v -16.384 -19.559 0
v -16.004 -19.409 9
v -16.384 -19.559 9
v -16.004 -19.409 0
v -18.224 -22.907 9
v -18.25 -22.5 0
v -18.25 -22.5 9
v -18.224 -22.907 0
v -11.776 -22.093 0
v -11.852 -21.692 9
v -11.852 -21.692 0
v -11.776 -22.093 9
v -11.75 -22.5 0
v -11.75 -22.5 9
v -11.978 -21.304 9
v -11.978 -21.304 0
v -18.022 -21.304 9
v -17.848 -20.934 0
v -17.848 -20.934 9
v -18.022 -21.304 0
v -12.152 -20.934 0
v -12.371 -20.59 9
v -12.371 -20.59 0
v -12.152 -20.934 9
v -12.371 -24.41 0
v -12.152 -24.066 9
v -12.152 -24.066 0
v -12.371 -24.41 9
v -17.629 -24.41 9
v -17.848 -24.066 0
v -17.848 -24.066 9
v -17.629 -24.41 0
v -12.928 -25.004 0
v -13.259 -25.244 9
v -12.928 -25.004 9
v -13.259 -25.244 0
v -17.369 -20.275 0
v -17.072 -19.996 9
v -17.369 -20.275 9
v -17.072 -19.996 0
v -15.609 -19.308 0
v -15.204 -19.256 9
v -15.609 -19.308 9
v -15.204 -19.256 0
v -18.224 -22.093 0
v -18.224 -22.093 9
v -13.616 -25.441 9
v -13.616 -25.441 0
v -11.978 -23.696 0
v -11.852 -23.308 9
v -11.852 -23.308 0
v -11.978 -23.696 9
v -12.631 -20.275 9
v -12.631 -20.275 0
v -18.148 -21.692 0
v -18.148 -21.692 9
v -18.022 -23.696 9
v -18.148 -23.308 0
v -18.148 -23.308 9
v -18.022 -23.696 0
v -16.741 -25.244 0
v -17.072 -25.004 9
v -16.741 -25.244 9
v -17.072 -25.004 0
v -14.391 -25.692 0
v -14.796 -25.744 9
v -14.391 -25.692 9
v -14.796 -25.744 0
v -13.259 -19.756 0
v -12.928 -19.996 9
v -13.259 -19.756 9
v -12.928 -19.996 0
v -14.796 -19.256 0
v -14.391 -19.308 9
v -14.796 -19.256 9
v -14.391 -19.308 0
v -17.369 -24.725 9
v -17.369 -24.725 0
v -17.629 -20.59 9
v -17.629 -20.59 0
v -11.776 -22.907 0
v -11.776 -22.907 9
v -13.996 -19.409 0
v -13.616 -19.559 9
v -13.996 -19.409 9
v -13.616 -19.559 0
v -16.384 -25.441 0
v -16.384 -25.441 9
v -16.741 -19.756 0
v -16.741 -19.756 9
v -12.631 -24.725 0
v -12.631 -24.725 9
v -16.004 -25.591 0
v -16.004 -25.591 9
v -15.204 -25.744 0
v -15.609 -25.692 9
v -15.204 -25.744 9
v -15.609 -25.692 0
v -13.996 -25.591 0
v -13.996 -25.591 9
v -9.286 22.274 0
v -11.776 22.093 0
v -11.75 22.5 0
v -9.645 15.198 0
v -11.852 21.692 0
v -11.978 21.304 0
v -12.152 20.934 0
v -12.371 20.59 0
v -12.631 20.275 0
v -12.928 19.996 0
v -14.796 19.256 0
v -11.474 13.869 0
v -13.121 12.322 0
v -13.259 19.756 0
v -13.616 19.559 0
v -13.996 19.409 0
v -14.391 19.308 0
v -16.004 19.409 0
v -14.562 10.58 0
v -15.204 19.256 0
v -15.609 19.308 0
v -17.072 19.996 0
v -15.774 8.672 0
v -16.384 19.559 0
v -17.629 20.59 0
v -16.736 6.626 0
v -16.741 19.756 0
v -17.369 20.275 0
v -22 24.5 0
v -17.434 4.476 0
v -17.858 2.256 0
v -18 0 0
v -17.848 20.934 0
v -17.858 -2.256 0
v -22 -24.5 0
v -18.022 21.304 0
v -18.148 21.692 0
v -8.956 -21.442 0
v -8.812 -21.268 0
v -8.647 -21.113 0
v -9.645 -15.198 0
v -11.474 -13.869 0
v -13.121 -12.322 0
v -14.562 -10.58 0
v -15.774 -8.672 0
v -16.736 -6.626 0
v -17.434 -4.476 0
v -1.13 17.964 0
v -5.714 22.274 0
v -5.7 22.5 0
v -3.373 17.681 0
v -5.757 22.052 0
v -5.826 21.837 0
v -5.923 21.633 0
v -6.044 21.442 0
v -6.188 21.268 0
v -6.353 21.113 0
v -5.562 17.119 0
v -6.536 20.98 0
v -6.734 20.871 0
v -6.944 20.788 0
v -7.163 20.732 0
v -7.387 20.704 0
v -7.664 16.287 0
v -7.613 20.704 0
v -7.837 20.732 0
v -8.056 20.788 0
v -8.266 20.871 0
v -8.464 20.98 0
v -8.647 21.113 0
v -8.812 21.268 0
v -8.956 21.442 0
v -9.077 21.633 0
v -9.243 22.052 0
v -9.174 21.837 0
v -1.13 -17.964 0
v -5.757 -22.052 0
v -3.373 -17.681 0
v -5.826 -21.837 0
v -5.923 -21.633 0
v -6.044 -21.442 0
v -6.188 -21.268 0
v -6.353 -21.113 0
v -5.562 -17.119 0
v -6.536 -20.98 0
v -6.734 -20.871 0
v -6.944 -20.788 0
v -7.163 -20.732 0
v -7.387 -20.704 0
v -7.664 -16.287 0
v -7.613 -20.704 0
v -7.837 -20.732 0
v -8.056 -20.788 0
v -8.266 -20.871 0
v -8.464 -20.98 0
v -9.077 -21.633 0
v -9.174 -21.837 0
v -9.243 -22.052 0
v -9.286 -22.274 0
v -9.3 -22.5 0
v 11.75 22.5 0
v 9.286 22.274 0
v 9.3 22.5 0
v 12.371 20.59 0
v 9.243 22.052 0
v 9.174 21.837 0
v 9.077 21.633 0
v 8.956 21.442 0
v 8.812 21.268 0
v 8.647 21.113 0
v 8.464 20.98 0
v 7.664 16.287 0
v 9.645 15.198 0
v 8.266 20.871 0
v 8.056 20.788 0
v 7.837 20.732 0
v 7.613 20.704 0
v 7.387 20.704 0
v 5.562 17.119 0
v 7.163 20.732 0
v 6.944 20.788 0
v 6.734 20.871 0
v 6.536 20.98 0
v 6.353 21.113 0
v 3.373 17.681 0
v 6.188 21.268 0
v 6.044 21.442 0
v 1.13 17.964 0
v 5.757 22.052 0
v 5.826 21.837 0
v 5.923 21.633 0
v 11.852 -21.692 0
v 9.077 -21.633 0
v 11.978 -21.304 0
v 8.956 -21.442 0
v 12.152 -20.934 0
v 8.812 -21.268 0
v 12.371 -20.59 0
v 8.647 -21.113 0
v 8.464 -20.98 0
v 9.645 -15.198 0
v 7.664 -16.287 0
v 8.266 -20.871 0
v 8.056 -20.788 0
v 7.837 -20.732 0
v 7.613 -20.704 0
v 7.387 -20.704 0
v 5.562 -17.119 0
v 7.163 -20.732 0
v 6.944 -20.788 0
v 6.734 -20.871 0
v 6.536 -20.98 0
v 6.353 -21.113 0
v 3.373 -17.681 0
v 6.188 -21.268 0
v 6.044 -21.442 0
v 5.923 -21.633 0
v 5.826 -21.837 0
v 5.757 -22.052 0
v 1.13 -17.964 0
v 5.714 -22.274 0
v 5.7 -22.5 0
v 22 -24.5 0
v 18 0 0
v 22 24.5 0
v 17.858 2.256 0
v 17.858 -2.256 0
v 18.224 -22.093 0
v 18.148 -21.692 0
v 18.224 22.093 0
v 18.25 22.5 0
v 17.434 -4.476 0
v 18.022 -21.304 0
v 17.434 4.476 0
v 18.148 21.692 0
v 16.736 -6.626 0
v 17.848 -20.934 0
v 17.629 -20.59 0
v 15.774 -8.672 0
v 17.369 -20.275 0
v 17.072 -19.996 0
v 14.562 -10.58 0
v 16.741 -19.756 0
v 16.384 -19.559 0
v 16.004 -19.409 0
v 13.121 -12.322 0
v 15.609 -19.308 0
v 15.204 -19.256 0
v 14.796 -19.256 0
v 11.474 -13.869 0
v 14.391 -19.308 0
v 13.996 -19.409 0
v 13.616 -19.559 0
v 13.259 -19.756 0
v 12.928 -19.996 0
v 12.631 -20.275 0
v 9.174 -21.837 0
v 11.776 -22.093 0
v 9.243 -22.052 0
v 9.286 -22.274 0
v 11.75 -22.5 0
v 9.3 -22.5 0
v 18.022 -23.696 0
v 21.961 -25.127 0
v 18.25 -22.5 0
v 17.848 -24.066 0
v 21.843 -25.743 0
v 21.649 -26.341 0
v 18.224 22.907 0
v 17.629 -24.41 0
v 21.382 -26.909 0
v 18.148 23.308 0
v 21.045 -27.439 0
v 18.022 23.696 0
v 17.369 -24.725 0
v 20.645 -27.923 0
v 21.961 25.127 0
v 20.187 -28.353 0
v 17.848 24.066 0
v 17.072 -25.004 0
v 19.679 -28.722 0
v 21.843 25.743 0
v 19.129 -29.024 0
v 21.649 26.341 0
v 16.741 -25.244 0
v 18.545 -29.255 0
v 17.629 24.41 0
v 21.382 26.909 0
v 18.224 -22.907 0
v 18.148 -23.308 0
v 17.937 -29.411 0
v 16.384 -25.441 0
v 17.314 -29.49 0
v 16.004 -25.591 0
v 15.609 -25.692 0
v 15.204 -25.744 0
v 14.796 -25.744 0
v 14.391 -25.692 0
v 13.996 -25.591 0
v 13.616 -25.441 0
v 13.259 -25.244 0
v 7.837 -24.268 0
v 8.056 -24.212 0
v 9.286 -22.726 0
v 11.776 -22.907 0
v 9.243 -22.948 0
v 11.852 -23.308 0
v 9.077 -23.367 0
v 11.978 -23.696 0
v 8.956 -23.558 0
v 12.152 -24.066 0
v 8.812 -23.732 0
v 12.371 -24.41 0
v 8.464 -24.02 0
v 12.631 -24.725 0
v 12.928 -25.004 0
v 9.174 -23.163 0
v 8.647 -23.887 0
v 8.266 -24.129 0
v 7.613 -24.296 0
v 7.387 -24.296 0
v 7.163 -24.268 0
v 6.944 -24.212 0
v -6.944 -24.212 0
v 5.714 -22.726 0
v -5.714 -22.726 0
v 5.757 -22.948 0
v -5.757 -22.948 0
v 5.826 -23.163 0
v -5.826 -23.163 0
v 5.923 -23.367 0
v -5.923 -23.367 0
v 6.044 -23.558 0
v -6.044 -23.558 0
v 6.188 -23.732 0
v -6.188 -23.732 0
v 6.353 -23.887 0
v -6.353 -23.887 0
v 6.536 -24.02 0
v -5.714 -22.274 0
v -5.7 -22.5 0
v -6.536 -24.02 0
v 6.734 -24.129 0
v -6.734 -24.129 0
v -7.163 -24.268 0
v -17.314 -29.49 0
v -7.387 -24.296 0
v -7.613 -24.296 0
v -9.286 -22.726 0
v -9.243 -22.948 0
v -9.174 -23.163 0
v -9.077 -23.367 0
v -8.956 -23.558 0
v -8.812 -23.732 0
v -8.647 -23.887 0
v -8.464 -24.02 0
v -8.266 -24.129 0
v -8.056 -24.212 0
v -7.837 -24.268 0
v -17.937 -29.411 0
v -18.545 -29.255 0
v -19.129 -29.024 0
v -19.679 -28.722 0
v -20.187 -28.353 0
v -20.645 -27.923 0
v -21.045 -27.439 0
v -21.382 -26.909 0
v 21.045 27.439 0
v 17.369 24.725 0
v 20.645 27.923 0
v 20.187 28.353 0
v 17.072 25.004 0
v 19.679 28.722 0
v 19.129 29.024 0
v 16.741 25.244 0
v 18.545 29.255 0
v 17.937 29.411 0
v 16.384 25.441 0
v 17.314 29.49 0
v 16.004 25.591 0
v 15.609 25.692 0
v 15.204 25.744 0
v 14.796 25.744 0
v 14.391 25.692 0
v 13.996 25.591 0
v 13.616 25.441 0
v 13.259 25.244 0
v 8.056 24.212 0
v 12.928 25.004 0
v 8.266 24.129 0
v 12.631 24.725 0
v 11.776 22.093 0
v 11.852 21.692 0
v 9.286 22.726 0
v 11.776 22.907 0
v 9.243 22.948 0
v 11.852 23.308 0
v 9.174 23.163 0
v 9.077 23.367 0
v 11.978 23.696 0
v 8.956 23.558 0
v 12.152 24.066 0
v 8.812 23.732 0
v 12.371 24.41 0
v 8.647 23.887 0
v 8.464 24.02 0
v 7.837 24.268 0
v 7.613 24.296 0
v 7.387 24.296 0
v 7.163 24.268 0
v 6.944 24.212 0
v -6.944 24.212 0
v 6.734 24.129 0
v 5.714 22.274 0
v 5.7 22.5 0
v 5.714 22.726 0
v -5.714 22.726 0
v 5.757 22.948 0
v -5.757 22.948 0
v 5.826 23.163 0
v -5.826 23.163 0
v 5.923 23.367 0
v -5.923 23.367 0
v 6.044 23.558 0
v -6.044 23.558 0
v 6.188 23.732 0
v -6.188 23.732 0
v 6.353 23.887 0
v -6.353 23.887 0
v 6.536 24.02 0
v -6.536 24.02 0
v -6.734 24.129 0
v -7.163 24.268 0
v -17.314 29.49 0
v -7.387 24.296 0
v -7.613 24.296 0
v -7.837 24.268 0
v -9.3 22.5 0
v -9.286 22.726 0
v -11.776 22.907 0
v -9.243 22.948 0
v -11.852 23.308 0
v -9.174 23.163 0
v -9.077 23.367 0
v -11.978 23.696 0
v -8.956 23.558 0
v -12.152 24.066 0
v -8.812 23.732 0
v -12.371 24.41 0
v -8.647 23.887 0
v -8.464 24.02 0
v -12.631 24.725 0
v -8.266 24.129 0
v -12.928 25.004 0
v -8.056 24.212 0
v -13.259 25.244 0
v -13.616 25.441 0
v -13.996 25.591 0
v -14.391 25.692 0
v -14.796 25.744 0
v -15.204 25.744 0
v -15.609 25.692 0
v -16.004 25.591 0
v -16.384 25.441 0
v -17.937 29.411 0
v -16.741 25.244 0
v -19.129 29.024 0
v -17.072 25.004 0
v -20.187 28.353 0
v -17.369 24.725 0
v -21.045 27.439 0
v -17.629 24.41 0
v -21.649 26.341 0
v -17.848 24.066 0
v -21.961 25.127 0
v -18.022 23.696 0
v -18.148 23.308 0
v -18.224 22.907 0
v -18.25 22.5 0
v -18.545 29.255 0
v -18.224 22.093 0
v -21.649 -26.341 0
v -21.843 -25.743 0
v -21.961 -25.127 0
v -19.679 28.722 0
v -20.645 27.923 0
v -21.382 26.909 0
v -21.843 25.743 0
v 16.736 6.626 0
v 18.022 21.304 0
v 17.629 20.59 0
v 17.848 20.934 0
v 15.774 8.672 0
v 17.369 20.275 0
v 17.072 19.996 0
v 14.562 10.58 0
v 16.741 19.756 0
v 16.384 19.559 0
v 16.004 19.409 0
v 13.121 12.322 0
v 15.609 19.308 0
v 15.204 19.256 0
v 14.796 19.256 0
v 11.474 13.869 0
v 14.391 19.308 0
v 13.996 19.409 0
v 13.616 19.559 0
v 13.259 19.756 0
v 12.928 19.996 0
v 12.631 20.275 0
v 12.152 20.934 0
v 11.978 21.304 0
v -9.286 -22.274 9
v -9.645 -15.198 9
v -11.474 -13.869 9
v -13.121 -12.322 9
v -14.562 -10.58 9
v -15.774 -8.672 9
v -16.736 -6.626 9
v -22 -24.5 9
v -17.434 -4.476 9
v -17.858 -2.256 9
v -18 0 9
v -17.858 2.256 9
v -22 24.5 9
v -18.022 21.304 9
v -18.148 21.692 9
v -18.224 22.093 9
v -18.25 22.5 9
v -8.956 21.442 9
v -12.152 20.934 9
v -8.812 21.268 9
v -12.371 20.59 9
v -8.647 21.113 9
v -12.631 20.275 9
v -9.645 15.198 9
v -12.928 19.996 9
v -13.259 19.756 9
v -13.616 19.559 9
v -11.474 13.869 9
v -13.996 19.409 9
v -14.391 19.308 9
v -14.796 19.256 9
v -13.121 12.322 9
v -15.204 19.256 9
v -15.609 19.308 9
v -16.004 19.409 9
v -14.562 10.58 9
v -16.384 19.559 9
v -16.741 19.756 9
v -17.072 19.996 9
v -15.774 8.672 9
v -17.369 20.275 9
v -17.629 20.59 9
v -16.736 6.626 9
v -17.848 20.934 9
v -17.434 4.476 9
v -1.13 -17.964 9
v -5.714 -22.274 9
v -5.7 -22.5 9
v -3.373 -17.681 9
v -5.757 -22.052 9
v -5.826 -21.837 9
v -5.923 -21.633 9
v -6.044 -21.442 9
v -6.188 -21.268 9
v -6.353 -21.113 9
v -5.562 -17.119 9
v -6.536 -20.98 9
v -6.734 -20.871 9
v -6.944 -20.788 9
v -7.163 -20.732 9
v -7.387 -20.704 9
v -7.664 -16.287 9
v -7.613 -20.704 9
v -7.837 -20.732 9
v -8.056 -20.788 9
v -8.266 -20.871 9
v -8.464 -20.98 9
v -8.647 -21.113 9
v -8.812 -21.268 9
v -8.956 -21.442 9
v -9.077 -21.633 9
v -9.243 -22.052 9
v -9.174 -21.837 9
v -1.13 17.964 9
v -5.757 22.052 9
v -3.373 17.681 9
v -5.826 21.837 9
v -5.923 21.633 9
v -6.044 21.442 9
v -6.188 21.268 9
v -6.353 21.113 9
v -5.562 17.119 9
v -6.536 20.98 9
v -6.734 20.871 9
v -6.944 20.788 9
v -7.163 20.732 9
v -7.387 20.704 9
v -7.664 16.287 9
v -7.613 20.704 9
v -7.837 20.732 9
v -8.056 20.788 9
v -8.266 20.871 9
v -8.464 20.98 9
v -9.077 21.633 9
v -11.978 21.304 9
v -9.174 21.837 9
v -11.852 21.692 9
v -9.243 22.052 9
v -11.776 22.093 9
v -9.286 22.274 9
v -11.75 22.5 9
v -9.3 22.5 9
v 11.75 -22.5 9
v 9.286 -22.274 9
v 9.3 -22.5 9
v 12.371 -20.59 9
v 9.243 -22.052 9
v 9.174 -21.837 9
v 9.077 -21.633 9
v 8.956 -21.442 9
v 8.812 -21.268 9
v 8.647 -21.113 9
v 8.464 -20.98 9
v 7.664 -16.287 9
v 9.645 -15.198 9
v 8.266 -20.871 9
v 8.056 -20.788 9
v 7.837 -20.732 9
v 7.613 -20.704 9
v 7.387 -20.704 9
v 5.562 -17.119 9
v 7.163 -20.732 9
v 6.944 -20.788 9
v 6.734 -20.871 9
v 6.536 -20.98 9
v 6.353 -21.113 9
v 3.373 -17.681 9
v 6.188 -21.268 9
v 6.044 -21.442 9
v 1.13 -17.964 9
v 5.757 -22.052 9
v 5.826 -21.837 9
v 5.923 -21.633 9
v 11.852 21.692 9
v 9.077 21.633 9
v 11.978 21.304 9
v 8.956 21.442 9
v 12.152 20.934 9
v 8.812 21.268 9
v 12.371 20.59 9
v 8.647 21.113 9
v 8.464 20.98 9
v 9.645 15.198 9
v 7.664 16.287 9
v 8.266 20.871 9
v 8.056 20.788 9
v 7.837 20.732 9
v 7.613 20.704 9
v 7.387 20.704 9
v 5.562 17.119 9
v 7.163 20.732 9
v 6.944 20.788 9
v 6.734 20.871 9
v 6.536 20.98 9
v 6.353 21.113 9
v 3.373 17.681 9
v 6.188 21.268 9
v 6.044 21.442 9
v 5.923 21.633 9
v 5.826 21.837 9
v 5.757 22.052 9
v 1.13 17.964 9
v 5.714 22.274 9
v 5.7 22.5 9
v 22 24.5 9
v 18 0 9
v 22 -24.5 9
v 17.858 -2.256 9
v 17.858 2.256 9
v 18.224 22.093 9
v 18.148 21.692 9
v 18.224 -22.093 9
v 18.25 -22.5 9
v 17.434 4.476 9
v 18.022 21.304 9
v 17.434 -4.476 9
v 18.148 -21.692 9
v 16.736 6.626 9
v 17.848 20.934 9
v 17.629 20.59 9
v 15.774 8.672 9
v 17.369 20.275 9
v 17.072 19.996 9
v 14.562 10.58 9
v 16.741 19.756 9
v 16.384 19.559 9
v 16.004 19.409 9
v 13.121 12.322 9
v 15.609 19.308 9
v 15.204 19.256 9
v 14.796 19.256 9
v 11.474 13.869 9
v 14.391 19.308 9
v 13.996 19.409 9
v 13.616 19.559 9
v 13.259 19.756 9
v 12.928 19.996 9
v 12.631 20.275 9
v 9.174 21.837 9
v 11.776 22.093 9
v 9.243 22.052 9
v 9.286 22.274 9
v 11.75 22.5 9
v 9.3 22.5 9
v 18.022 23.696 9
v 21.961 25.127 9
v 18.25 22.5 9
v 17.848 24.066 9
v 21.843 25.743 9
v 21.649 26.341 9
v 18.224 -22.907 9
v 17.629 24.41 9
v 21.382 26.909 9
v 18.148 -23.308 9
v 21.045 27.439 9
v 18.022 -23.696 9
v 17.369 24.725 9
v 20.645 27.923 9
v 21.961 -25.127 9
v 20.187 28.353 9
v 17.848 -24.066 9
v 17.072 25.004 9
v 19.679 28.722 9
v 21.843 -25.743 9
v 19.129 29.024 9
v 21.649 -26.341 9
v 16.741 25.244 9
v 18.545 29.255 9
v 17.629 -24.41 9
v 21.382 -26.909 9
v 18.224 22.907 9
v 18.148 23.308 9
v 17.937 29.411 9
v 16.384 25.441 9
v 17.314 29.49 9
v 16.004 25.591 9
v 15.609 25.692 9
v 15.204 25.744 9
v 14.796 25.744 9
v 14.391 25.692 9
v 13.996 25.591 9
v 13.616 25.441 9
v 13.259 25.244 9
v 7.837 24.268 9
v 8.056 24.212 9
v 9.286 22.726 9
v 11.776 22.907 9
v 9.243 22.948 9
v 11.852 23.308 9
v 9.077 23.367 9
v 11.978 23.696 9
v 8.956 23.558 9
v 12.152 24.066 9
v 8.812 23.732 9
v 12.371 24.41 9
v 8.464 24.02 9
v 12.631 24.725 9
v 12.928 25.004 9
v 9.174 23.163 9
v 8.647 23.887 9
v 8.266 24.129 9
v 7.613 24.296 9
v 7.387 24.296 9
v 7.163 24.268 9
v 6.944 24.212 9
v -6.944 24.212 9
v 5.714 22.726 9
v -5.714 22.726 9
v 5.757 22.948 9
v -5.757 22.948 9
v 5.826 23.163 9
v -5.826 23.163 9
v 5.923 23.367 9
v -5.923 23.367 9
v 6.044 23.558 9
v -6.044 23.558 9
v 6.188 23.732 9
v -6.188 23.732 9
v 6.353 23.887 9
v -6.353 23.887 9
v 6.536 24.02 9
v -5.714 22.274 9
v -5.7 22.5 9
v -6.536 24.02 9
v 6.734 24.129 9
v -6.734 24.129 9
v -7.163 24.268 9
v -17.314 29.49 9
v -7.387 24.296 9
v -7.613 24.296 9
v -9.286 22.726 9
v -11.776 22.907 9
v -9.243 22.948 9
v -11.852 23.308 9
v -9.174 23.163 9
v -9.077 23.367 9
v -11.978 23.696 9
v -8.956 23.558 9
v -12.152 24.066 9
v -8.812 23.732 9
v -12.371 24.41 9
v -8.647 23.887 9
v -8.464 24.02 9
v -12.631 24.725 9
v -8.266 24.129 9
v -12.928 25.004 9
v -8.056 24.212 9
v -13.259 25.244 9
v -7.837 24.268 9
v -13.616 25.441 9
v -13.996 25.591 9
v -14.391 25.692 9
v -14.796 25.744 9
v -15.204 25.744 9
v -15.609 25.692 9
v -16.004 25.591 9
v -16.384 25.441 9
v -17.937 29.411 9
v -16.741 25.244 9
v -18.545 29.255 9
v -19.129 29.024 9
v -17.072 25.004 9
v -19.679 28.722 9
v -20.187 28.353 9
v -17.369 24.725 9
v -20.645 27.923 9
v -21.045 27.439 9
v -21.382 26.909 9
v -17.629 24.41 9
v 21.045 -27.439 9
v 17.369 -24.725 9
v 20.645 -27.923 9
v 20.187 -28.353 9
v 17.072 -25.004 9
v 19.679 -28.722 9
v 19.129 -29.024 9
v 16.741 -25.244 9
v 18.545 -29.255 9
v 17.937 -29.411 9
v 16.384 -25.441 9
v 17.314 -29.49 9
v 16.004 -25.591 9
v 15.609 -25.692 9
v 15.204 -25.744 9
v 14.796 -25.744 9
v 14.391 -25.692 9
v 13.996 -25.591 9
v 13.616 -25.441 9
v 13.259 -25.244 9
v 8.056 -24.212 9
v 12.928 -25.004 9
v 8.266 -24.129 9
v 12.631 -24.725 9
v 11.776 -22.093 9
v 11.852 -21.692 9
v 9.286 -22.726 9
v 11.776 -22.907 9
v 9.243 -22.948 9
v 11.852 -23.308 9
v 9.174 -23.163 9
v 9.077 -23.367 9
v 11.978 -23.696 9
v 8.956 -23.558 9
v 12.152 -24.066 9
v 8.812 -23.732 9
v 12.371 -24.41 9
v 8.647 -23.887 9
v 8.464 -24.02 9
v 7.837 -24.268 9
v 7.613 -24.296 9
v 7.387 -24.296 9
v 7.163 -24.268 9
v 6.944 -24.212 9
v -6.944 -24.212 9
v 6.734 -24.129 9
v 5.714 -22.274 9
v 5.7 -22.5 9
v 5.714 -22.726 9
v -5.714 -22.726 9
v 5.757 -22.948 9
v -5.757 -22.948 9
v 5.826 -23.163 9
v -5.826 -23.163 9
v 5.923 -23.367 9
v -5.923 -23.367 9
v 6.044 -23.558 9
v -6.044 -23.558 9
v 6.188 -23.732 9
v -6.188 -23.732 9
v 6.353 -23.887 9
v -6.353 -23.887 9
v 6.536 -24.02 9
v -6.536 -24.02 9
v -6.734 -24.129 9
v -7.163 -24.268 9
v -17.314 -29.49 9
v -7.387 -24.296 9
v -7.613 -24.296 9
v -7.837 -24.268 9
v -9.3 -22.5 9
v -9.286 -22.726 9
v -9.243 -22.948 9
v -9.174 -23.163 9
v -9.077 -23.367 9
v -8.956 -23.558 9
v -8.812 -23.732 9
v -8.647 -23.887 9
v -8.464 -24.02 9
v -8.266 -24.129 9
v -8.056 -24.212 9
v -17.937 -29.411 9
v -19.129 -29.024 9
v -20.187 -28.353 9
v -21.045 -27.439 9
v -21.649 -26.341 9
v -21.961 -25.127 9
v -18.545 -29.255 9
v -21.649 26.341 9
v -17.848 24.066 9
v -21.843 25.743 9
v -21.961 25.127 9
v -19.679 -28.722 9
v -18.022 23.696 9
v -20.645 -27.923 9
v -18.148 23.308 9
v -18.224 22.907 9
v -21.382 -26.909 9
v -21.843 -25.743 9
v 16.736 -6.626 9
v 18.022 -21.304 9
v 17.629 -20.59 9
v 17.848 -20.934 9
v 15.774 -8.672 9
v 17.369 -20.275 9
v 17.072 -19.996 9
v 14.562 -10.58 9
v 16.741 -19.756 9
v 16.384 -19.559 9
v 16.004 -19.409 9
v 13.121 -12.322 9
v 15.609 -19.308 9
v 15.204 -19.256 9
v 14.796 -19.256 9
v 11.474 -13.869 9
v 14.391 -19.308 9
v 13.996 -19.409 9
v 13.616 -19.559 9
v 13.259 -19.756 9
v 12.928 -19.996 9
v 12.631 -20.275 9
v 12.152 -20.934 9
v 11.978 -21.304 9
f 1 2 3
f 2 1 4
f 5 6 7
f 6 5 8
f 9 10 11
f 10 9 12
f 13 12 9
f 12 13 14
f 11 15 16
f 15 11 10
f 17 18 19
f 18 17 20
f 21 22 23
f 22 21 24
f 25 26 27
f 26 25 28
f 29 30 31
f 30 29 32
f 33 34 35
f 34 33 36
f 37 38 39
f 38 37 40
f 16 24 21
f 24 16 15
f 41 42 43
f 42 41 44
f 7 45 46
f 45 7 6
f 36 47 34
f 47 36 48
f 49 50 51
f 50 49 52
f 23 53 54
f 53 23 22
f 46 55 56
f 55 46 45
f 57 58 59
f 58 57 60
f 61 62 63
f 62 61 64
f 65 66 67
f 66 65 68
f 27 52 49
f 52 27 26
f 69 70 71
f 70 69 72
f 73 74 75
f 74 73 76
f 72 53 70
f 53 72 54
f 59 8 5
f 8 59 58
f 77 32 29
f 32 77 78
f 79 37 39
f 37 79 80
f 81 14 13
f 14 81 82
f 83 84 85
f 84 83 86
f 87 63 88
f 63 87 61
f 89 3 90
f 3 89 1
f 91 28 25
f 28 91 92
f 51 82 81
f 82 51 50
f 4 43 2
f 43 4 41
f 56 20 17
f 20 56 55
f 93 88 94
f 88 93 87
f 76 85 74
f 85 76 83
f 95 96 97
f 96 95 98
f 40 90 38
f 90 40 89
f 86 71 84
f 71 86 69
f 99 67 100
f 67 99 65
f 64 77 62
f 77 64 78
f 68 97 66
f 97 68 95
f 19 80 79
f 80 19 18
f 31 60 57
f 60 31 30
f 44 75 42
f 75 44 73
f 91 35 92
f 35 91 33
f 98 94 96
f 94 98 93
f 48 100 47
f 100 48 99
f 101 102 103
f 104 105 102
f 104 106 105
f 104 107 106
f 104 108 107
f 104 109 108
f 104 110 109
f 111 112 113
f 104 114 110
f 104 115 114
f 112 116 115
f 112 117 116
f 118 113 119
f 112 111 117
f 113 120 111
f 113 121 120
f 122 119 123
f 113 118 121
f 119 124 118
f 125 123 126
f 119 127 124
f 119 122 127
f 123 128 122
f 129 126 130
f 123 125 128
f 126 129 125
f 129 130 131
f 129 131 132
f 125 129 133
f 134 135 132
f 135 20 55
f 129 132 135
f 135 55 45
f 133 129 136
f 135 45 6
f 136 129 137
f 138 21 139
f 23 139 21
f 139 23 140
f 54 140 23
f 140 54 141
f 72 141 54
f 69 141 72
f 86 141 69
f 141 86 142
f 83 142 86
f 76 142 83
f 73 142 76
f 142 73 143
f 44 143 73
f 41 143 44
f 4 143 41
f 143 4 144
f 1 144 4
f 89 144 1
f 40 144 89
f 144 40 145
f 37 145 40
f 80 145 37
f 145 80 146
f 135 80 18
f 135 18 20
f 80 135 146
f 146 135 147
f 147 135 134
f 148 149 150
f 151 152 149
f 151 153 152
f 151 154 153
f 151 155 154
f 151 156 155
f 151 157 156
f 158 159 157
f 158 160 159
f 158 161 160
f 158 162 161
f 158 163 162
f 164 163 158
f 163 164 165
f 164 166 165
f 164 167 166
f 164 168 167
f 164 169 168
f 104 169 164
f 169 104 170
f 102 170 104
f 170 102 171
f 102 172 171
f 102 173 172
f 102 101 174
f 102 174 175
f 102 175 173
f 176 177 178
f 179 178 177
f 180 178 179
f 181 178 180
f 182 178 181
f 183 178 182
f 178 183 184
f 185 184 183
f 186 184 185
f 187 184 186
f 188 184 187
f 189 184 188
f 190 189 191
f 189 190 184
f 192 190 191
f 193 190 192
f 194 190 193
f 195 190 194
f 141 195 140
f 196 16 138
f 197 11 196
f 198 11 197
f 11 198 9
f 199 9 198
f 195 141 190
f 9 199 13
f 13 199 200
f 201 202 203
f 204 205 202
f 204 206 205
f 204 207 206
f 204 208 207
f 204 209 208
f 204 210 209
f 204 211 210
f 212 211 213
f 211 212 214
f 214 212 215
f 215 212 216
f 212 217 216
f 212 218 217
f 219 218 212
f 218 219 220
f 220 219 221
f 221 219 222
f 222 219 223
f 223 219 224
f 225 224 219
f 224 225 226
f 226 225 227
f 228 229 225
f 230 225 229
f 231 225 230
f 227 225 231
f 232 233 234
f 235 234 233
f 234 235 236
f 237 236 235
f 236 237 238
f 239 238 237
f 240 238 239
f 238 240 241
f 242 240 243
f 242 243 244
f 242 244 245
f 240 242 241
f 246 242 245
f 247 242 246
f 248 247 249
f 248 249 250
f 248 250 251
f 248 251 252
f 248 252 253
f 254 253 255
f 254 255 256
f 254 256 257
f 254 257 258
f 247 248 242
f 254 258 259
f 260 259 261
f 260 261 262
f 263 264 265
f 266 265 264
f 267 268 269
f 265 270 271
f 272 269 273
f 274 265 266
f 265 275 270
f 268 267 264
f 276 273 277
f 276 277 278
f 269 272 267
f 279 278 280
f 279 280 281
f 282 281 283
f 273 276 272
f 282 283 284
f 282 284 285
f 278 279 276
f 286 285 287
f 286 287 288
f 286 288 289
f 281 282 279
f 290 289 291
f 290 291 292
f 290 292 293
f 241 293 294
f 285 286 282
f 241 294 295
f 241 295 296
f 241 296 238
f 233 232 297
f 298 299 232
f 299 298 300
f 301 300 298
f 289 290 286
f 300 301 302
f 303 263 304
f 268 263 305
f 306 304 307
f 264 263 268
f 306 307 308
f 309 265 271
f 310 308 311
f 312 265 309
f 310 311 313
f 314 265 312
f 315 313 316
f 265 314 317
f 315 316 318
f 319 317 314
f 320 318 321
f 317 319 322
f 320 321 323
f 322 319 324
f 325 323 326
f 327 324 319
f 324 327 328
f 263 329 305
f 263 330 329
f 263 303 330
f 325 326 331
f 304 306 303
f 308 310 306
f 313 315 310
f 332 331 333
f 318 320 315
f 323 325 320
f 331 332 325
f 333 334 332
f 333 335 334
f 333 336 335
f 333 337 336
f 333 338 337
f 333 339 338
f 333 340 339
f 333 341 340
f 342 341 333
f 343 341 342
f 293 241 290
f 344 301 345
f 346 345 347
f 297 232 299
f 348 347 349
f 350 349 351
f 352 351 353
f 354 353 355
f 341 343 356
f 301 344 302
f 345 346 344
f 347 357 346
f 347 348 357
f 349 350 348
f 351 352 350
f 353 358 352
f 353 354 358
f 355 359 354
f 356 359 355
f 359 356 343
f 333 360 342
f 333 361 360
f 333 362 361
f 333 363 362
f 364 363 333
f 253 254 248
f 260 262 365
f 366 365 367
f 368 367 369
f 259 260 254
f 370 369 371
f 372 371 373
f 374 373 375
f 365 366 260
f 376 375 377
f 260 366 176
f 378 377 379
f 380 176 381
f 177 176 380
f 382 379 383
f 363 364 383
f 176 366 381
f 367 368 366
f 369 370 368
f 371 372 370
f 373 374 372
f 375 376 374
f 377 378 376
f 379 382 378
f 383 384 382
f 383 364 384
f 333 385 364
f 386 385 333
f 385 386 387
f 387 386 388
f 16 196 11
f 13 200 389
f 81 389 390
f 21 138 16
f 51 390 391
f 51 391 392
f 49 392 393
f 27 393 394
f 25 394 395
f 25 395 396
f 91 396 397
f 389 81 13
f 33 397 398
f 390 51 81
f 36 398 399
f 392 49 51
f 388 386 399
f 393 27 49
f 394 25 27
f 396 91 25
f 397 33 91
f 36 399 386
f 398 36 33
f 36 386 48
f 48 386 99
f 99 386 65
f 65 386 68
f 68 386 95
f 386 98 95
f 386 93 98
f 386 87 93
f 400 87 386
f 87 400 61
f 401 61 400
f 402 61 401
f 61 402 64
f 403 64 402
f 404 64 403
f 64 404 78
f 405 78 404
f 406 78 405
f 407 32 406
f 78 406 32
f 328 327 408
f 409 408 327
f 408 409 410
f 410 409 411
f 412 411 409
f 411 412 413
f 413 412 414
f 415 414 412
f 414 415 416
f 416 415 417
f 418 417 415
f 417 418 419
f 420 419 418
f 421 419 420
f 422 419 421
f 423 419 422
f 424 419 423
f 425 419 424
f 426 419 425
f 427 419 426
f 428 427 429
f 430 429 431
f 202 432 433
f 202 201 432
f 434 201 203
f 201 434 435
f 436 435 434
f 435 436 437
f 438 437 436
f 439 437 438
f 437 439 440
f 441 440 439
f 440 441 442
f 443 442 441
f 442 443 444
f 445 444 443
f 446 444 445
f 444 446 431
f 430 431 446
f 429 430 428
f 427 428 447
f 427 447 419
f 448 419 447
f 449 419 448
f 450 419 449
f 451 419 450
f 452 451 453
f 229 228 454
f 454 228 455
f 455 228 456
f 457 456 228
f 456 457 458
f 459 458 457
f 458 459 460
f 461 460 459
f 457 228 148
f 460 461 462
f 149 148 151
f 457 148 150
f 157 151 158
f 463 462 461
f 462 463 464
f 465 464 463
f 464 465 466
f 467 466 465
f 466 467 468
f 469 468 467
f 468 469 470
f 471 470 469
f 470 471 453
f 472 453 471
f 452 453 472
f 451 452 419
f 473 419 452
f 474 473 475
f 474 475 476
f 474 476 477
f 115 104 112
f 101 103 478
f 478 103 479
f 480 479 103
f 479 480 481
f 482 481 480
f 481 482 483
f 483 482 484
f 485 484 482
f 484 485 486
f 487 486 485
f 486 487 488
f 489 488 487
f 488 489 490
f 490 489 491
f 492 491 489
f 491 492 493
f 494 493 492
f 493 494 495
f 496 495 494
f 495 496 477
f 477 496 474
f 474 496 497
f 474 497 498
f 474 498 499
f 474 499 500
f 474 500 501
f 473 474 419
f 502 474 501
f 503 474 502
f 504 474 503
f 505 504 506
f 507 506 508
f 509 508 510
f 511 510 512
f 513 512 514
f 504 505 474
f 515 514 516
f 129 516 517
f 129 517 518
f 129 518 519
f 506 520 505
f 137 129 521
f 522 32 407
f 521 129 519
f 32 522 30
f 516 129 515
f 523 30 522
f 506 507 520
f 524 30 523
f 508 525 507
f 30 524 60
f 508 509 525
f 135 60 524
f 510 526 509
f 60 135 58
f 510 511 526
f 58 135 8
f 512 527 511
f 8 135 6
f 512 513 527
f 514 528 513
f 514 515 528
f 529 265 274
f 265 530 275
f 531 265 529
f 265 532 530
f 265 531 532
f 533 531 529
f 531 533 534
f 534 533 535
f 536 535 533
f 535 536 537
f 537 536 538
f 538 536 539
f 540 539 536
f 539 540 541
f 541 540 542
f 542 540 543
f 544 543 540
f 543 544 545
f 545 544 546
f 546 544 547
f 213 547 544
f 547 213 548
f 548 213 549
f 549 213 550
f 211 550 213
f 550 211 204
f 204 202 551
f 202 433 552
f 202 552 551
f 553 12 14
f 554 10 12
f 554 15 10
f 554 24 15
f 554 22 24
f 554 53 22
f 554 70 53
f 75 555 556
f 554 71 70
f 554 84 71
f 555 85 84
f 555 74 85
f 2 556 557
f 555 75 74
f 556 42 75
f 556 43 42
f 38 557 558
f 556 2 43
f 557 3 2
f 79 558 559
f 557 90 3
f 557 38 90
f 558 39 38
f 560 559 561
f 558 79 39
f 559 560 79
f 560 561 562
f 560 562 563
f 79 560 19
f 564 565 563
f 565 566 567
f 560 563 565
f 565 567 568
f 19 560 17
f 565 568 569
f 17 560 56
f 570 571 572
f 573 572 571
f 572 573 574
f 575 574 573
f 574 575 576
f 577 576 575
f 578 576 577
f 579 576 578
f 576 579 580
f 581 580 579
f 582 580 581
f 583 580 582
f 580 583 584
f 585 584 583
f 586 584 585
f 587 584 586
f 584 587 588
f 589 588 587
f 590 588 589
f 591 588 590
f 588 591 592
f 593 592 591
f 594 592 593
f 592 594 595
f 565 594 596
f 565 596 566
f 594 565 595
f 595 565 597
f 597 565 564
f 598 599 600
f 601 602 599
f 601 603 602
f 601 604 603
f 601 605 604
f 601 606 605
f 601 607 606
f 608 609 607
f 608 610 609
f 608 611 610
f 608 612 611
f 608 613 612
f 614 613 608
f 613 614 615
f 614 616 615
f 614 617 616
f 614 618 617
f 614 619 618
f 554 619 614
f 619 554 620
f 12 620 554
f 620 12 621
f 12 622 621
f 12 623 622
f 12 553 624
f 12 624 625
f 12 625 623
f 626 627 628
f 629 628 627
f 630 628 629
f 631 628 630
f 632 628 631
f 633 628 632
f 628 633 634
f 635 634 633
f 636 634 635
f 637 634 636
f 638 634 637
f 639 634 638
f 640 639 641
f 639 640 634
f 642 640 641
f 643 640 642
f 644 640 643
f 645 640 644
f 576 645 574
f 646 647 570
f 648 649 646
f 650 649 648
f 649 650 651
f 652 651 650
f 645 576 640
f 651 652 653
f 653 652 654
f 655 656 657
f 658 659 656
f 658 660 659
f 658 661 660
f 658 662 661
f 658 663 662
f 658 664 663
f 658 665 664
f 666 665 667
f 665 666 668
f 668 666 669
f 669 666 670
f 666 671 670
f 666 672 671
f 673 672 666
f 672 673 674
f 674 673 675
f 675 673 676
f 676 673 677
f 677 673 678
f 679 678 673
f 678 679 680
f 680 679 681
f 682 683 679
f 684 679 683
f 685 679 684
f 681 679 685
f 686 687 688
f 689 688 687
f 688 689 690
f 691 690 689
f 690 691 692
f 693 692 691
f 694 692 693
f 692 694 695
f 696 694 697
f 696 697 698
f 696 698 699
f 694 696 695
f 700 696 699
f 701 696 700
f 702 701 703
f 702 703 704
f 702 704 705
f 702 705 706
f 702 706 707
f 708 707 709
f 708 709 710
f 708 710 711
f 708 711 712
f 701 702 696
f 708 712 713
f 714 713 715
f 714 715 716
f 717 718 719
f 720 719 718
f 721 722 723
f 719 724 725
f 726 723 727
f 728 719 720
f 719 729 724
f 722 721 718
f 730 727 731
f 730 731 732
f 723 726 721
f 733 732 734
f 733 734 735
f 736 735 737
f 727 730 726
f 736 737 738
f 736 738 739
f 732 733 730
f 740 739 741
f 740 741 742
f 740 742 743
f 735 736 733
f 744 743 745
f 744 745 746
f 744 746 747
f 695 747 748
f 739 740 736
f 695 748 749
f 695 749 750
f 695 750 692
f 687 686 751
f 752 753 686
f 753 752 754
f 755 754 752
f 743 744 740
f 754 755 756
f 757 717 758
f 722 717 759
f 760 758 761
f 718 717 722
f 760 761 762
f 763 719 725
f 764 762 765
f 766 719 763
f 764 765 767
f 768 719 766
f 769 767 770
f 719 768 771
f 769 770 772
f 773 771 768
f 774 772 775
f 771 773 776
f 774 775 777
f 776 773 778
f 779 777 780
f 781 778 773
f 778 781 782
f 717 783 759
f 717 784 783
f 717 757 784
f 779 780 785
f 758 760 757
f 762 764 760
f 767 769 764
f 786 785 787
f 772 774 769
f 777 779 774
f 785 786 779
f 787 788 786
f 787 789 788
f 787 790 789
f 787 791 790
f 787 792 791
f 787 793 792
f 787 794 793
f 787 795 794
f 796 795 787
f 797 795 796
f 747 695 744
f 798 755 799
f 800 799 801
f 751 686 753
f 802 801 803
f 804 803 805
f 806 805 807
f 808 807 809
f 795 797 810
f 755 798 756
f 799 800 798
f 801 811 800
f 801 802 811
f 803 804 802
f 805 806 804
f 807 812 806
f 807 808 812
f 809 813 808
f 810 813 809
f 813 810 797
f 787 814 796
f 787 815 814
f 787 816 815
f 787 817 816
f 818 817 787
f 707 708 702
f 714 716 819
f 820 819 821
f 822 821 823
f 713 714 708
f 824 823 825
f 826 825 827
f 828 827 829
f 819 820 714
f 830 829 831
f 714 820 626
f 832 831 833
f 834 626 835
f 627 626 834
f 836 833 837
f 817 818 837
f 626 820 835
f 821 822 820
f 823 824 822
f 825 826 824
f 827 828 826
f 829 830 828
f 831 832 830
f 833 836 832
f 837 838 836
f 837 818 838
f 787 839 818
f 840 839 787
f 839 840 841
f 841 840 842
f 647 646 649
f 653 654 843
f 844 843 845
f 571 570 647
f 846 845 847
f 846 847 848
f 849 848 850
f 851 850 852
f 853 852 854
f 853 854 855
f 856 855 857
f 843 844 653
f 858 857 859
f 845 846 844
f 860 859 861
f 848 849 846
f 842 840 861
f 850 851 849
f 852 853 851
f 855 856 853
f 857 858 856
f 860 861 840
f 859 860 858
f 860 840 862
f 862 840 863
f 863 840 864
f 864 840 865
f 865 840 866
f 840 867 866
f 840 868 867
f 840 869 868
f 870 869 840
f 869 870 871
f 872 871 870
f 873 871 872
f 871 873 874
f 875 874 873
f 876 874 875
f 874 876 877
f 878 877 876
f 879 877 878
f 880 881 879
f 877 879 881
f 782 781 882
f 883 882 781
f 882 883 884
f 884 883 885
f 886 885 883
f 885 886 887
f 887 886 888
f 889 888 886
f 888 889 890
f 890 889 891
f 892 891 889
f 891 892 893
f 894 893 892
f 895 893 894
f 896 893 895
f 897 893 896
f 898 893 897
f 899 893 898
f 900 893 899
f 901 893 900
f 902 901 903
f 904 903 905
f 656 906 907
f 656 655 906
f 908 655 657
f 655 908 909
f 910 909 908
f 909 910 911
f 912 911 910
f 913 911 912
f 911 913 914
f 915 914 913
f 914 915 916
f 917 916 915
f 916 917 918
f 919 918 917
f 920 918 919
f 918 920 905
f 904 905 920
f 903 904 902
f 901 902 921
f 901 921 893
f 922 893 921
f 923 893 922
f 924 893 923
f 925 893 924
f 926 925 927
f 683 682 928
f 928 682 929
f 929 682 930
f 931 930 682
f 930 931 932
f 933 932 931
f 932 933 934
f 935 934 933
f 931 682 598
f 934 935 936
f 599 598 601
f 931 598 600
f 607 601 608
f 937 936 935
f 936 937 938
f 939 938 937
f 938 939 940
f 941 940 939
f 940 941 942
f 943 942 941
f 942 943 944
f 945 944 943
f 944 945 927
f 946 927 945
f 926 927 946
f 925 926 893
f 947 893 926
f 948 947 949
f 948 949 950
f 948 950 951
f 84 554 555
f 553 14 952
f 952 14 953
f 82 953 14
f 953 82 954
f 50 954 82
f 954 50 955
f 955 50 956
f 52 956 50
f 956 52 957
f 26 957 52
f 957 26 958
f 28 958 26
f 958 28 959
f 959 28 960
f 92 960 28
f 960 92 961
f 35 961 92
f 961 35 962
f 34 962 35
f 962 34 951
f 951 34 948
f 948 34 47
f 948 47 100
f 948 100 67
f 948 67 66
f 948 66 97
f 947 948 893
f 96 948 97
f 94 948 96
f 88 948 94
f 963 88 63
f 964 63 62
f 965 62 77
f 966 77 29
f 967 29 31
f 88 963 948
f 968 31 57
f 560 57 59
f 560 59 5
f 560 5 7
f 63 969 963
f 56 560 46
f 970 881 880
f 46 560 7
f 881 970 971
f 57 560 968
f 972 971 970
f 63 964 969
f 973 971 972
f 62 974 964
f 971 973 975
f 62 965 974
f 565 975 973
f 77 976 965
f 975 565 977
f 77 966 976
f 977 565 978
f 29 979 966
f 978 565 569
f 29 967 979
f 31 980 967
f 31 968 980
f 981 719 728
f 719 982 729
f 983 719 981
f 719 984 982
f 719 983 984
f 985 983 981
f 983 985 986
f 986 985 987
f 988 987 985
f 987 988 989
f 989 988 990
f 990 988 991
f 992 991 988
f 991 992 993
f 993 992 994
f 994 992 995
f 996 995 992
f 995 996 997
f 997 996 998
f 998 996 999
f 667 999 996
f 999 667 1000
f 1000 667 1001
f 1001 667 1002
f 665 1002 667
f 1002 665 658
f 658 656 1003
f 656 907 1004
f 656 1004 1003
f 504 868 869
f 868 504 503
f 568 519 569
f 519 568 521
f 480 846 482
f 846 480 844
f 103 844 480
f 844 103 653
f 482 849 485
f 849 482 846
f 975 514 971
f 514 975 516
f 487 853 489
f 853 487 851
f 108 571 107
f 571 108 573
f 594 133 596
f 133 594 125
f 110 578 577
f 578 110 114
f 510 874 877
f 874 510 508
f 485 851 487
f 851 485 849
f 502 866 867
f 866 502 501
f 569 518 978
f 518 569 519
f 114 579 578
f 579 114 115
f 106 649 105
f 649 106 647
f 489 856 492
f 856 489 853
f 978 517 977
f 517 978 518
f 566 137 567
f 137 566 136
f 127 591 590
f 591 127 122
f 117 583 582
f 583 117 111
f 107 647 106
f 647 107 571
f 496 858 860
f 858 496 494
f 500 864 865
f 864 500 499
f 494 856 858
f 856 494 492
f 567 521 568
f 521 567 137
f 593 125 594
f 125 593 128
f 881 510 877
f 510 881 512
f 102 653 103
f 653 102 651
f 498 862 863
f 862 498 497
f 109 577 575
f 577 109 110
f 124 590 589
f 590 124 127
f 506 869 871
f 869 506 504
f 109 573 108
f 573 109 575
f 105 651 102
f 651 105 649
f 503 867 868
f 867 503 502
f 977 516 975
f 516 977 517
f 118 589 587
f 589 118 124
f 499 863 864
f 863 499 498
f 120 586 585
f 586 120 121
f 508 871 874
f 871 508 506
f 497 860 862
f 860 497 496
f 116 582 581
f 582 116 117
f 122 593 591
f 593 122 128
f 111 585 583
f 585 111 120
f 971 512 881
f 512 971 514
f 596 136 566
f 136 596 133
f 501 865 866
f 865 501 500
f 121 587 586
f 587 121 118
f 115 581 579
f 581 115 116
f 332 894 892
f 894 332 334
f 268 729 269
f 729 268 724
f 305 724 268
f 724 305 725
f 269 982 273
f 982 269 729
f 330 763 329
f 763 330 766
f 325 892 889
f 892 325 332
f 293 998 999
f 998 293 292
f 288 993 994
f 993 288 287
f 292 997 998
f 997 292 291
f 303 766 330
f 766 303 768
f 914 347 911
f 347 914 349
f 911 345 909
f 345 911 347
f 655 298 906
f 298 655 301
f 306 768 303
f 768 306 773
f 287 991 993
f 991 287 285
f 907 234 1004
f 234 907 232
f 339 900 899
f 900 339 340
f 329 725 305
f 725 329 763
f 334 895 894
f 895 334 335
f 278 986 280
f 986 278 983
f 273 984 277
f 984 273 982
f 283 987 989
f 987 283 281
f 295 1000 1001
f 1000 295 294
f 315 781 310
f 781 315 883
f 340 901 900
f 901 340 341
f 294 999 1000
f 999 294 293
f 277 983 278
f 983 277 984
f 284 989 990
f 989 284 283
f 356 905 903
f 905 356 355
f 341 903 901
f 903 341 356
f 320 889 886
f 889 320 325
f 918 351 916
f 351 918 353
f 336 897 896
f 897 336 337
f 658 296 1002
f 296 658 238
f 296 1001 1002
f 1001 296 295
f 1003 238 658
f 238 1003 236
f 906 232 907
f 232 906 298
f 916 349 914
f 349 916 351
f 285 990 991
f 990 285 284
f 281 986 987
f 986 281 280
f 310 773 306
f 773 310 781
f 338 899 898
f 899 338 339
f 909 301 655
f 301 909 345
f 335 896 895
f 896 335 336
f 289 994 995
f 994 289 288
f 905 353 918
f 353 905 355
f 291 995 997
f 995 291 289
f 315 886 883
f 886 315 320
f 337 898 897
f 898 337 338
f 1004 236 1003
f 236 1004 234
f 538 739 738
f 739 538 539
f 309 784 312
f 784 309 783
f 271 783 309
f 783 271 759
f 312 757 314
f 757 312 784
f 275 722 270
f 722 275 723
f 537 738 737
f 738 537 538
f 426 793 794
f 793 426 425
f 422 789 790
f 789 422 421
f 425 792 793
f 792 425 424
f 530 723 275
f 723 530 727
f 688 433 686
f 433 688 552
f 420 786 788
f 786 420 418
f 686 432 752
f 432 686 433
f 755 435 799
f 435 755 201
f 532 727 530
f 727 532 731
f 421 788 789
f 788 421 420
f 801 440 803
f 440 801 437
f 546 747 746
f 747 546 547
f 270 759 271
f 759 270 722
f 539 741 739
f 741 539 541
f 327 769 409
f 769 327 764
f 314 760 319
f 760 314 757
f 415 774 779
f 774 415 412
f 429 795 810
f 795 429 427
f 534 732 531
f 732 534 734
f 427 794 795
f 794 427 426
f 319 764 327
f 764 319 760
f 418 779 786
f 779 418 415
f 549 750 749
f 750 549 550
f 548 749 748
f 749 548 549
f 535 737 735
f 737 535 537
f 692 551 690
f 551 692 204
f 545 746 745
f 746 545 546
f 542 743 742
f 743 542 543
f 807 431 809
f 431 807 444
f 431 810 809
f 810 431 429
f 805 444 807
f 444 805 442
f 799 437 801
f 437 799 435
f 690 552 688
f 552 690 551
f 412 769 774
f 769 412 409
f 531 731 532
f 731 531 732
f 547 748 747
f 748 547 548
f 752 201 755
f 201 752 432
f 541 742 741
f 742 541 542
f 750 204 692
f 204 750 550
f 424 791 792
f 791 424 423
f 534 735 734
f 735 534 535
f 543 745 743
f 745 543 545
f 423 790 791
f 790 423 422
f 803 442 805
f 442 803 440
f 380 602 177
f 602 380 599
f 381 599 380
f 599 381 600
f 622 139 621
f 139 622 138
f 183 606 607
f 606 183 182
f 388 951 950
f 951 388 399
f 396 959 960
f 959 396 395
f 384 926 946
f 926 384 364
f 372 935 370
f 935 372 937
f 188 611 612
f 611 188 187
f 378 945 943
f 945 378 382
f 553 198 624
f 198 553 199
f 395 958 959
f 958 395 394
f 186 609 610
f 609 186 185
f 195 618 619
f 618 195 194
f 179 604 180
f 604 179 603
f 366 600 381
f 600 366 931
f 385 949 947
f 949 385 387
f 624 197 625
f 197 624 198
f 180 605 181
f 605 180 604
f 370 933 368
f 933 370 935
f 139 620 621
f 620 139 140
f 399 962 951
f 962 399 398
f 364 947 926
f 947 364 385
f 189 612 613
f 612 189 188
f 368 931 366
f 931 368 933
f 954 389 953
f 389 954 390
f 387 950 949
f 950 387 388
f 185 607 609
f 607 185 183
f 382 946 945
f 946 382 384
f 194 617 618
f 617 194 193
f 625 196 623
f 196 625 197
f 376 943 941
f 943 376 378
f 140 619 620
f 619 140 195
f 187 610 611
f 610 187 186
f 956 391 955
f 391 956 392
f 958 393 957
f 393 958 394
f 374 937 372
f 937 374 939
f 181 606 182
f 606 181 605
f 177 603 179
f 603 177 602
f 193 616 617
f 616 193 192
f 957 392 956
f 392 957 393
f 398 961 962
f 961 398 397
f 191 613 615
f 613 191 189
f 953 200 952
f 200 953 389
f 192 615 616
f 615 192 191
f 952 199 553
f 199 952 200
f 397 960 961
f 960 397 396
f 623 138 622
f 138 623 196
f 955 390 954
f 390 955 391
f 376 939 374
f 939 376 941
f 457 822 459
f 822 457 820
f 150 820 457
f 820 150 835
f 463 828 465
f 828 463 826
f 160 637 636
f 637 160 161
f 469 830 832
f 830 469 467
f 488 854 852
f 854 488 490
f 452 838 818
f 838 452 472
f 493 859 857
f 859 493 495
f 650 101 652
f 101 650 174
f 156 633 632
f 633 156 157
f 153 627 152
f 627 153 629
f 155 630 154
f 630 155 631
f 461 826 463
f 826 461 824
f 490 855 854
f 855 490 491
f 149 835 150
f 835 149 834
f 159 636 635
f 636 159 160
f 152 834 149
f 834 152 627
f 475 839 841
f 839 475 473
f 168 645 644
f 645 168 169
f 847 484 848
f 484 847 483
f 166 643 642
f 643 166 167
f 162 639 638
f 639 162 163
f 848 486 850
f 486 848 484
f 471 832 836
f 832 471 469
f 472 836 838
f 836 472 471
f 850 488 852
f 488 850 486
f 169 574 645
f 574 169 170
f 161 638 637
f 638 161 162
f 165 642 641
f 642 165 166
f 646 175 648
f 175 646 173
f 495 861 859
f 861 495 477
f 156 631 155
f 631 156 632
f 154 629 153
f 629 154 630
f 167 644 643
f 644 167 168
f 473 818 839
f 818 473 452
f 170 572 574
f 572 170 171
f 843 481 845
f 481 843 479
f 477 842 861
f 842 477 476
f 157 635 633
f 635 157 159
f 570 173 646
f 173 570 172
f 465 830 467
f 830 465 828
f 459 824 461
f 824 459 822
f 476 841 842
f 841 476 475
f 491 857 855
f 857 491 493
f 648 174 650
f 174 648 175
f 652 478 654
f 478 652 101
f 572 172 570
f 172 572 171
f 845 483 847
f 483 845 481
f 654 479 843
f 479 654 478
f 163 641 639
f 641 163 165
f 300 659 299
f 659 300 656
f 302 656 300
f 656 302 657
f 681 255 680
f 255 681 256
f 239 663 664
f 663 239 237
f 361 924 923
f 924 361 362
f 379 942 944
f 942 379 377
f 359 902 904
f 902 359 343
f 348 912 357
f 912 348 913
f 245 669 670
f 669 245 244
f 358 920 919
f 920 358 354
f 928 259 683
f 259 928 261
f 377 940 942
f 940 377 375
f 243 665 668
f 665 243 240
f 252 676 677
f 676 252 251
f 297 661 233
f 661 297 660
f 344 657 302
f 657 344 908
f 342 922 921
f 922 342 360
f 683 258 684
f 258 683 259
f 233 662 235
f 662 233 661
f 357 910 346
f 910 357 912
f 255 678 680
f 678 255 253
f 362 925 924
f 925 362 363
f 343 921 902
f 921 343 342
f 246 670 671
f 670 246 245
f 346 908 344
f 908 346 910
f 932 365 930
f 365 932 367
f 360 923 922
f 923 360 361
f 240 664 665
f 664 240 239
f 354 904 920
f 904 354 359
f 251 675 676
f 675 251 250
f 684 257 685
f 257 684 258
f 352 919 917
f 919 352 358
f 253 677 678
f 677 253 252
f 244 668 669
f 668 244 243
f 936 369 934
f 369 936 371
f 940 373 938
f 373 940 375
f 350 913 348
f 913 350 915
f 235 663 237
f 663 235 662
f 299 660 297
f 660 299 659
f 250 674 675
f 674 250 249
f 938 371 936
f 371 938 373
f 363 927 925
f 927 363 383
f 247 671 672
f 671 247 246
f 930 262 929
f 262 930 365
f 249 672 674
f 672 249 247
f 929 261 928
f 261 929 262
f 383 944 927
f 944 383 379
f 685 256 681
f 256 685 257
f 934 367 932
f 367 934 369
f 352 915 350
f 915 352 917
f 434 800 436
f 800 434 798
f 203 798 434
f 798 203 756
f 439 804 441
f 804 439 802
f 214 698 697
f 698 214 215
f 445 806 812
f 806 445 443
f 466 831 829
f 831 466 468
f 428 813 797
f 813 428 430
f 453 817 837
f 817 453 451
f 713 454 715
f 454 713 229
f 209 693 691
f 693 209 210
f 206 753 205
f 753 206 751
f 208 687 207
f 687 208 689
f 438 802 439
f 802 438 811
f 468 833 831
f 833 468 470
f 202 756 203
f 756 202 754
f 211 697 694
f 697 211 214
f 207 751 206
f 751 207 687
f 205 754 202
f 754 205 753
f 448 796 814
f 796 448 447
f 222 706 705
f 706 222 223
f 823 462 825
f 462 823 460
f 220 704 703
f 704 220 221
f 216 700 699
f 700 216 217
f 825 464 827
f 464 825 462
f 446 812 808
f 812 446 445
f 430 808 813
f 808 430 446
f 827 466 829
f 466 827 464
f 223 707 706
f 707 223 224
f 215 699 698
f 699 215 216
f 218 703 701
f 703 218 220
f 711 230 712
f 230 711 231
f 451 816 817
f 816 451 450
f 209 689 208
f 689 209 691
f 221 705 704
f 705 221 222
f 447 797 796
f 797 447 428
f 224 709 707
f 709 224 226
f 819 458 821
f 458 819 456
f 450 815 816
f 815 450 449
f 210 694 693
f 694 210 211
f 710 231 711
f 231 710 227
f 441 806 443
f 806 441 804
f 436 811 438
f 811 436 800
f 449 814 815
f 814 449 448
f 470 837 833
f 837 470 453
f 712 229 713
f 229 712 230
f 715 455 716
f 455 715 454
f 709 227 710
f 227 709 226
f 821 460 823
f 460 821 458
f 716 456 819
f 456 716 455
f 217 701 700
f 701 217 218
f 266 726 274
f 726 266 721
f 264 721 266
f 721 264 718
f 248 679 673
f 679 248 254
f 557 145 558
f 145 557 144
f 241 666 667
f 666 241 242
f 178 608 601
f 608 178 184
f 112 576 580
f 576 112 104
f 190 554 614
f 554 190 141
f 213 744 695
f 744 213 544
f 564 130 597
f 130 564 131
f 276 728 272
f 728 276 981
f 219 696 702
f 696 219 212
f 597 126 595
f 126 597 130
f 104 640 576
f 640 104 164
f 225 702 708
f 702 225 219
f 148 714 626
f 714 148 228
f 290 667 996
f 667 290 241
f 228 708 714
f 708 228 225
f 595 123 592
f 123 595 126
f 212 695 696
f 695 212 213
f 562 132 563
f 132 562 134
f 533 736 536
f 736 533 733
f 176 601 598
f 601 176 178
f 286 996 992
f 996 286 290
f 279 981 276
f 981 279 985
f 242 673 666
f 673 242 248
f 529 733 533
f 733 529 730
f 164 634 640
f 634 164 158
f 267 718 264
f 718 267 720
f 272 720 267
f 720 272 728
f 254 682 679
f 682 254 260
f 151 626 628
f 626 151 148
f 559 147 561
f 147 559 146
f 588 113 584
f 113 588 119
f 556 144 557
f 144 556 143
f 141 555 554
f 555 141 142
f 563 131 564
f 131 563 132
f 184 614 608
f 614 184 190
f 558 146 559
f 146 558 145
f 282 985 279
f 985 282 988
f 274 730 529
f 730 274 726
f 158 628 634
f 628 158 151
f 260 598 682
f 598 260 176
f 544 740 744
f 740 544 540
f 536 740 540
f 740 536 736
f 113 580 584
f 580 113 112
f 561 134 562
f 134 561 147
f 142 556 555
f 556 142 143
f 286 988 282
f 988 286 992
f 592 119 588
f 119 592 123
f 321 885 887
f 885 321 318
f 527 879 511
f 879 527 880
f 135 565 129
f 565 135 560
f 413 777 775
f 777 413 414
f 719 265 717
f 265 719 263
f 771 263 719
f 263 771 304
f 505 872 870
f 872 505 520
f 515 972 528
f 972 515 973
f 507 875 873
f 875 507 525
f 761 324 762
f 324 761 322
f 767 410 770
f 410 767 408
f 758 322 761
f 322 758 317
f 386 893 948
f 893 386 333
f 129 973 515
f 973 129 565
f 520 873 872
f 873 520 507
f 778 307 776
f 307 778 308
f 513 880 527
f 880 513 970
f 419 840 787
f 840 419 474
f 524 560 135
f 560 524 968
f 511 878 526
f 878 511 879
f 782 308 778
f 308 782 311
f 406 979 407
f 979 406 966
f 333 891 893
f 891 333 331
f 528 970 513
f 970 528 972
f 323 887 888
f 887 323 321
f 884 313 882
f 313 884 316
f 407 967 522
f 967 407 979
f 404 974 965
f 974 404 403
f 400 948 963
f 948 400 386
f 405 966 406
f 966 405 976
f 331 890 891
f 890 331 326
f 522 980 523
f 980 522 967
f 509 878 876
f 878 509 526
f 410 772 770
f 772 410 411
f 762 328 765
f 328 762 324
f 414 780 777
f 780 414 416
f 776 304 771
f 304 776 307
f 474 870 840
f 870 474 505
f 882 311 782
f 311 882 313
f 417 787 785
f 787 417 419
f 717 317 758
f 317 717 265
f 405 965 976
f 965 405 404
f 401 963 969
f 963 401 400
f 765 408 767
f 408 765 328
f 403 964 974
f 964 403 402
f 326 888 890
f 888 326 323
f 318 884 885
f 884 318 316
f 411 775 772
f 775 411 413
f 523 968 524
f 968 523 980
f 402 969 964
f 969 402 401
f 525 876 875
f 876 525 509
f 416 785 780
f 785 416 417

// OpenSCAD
$fn = 50;

difference() {
	union() {
		hull() {
			translate(v = [-17.0, 24.5, 0]) {
				cylinder(h = 9, r = 5);
			}
			translate(v = [17.0, 24.5, 0]) {
				cylinder(h = 9, r = 5);
			}
			translate(v = [-17.0, -24.5, 0]) {
				cylinder(h = 9, r = 5);
			}
			translate(v = [17.0, -24.5, 0]) {
				cylinder(h = 9, r = 5);
			}
		}
	}
	union() {
		translate(v = [-15.0, -22.5, 0]) {
			cylinder(h = 9, r = 3.25);
		}
		translate(v = [-15.0, 22.5, 0]) {
			cylinder(h = 9, r = 3.25);
		}
		translate(v = [15.0, -22.5, 0]) {
			cylinder(h = 9, r = 3.25);
		}
		translate(v = [15.0, 22.5, 0]) {
			cylinder(h = 9, r = 3.25);
		}
		translate(v = [-7.5, -22.5, 0]) {
			cylinder(h = 9, r = 1.8);
		}
		translate(v = [-7.5, 22.5, 0]) {
			cylinder(h = 9, r = 1.8);
		}
		translate(v = [7.5, -22.5, 0]) {
			cylinder(h = 9, r = 1.8);
		}
		translate(v = [7.5, 22.5, 0]) {
			cylinder(h = 9, r = 1.8);
		}
		cylinder(h = 9, r = 18.0);
	}
}
